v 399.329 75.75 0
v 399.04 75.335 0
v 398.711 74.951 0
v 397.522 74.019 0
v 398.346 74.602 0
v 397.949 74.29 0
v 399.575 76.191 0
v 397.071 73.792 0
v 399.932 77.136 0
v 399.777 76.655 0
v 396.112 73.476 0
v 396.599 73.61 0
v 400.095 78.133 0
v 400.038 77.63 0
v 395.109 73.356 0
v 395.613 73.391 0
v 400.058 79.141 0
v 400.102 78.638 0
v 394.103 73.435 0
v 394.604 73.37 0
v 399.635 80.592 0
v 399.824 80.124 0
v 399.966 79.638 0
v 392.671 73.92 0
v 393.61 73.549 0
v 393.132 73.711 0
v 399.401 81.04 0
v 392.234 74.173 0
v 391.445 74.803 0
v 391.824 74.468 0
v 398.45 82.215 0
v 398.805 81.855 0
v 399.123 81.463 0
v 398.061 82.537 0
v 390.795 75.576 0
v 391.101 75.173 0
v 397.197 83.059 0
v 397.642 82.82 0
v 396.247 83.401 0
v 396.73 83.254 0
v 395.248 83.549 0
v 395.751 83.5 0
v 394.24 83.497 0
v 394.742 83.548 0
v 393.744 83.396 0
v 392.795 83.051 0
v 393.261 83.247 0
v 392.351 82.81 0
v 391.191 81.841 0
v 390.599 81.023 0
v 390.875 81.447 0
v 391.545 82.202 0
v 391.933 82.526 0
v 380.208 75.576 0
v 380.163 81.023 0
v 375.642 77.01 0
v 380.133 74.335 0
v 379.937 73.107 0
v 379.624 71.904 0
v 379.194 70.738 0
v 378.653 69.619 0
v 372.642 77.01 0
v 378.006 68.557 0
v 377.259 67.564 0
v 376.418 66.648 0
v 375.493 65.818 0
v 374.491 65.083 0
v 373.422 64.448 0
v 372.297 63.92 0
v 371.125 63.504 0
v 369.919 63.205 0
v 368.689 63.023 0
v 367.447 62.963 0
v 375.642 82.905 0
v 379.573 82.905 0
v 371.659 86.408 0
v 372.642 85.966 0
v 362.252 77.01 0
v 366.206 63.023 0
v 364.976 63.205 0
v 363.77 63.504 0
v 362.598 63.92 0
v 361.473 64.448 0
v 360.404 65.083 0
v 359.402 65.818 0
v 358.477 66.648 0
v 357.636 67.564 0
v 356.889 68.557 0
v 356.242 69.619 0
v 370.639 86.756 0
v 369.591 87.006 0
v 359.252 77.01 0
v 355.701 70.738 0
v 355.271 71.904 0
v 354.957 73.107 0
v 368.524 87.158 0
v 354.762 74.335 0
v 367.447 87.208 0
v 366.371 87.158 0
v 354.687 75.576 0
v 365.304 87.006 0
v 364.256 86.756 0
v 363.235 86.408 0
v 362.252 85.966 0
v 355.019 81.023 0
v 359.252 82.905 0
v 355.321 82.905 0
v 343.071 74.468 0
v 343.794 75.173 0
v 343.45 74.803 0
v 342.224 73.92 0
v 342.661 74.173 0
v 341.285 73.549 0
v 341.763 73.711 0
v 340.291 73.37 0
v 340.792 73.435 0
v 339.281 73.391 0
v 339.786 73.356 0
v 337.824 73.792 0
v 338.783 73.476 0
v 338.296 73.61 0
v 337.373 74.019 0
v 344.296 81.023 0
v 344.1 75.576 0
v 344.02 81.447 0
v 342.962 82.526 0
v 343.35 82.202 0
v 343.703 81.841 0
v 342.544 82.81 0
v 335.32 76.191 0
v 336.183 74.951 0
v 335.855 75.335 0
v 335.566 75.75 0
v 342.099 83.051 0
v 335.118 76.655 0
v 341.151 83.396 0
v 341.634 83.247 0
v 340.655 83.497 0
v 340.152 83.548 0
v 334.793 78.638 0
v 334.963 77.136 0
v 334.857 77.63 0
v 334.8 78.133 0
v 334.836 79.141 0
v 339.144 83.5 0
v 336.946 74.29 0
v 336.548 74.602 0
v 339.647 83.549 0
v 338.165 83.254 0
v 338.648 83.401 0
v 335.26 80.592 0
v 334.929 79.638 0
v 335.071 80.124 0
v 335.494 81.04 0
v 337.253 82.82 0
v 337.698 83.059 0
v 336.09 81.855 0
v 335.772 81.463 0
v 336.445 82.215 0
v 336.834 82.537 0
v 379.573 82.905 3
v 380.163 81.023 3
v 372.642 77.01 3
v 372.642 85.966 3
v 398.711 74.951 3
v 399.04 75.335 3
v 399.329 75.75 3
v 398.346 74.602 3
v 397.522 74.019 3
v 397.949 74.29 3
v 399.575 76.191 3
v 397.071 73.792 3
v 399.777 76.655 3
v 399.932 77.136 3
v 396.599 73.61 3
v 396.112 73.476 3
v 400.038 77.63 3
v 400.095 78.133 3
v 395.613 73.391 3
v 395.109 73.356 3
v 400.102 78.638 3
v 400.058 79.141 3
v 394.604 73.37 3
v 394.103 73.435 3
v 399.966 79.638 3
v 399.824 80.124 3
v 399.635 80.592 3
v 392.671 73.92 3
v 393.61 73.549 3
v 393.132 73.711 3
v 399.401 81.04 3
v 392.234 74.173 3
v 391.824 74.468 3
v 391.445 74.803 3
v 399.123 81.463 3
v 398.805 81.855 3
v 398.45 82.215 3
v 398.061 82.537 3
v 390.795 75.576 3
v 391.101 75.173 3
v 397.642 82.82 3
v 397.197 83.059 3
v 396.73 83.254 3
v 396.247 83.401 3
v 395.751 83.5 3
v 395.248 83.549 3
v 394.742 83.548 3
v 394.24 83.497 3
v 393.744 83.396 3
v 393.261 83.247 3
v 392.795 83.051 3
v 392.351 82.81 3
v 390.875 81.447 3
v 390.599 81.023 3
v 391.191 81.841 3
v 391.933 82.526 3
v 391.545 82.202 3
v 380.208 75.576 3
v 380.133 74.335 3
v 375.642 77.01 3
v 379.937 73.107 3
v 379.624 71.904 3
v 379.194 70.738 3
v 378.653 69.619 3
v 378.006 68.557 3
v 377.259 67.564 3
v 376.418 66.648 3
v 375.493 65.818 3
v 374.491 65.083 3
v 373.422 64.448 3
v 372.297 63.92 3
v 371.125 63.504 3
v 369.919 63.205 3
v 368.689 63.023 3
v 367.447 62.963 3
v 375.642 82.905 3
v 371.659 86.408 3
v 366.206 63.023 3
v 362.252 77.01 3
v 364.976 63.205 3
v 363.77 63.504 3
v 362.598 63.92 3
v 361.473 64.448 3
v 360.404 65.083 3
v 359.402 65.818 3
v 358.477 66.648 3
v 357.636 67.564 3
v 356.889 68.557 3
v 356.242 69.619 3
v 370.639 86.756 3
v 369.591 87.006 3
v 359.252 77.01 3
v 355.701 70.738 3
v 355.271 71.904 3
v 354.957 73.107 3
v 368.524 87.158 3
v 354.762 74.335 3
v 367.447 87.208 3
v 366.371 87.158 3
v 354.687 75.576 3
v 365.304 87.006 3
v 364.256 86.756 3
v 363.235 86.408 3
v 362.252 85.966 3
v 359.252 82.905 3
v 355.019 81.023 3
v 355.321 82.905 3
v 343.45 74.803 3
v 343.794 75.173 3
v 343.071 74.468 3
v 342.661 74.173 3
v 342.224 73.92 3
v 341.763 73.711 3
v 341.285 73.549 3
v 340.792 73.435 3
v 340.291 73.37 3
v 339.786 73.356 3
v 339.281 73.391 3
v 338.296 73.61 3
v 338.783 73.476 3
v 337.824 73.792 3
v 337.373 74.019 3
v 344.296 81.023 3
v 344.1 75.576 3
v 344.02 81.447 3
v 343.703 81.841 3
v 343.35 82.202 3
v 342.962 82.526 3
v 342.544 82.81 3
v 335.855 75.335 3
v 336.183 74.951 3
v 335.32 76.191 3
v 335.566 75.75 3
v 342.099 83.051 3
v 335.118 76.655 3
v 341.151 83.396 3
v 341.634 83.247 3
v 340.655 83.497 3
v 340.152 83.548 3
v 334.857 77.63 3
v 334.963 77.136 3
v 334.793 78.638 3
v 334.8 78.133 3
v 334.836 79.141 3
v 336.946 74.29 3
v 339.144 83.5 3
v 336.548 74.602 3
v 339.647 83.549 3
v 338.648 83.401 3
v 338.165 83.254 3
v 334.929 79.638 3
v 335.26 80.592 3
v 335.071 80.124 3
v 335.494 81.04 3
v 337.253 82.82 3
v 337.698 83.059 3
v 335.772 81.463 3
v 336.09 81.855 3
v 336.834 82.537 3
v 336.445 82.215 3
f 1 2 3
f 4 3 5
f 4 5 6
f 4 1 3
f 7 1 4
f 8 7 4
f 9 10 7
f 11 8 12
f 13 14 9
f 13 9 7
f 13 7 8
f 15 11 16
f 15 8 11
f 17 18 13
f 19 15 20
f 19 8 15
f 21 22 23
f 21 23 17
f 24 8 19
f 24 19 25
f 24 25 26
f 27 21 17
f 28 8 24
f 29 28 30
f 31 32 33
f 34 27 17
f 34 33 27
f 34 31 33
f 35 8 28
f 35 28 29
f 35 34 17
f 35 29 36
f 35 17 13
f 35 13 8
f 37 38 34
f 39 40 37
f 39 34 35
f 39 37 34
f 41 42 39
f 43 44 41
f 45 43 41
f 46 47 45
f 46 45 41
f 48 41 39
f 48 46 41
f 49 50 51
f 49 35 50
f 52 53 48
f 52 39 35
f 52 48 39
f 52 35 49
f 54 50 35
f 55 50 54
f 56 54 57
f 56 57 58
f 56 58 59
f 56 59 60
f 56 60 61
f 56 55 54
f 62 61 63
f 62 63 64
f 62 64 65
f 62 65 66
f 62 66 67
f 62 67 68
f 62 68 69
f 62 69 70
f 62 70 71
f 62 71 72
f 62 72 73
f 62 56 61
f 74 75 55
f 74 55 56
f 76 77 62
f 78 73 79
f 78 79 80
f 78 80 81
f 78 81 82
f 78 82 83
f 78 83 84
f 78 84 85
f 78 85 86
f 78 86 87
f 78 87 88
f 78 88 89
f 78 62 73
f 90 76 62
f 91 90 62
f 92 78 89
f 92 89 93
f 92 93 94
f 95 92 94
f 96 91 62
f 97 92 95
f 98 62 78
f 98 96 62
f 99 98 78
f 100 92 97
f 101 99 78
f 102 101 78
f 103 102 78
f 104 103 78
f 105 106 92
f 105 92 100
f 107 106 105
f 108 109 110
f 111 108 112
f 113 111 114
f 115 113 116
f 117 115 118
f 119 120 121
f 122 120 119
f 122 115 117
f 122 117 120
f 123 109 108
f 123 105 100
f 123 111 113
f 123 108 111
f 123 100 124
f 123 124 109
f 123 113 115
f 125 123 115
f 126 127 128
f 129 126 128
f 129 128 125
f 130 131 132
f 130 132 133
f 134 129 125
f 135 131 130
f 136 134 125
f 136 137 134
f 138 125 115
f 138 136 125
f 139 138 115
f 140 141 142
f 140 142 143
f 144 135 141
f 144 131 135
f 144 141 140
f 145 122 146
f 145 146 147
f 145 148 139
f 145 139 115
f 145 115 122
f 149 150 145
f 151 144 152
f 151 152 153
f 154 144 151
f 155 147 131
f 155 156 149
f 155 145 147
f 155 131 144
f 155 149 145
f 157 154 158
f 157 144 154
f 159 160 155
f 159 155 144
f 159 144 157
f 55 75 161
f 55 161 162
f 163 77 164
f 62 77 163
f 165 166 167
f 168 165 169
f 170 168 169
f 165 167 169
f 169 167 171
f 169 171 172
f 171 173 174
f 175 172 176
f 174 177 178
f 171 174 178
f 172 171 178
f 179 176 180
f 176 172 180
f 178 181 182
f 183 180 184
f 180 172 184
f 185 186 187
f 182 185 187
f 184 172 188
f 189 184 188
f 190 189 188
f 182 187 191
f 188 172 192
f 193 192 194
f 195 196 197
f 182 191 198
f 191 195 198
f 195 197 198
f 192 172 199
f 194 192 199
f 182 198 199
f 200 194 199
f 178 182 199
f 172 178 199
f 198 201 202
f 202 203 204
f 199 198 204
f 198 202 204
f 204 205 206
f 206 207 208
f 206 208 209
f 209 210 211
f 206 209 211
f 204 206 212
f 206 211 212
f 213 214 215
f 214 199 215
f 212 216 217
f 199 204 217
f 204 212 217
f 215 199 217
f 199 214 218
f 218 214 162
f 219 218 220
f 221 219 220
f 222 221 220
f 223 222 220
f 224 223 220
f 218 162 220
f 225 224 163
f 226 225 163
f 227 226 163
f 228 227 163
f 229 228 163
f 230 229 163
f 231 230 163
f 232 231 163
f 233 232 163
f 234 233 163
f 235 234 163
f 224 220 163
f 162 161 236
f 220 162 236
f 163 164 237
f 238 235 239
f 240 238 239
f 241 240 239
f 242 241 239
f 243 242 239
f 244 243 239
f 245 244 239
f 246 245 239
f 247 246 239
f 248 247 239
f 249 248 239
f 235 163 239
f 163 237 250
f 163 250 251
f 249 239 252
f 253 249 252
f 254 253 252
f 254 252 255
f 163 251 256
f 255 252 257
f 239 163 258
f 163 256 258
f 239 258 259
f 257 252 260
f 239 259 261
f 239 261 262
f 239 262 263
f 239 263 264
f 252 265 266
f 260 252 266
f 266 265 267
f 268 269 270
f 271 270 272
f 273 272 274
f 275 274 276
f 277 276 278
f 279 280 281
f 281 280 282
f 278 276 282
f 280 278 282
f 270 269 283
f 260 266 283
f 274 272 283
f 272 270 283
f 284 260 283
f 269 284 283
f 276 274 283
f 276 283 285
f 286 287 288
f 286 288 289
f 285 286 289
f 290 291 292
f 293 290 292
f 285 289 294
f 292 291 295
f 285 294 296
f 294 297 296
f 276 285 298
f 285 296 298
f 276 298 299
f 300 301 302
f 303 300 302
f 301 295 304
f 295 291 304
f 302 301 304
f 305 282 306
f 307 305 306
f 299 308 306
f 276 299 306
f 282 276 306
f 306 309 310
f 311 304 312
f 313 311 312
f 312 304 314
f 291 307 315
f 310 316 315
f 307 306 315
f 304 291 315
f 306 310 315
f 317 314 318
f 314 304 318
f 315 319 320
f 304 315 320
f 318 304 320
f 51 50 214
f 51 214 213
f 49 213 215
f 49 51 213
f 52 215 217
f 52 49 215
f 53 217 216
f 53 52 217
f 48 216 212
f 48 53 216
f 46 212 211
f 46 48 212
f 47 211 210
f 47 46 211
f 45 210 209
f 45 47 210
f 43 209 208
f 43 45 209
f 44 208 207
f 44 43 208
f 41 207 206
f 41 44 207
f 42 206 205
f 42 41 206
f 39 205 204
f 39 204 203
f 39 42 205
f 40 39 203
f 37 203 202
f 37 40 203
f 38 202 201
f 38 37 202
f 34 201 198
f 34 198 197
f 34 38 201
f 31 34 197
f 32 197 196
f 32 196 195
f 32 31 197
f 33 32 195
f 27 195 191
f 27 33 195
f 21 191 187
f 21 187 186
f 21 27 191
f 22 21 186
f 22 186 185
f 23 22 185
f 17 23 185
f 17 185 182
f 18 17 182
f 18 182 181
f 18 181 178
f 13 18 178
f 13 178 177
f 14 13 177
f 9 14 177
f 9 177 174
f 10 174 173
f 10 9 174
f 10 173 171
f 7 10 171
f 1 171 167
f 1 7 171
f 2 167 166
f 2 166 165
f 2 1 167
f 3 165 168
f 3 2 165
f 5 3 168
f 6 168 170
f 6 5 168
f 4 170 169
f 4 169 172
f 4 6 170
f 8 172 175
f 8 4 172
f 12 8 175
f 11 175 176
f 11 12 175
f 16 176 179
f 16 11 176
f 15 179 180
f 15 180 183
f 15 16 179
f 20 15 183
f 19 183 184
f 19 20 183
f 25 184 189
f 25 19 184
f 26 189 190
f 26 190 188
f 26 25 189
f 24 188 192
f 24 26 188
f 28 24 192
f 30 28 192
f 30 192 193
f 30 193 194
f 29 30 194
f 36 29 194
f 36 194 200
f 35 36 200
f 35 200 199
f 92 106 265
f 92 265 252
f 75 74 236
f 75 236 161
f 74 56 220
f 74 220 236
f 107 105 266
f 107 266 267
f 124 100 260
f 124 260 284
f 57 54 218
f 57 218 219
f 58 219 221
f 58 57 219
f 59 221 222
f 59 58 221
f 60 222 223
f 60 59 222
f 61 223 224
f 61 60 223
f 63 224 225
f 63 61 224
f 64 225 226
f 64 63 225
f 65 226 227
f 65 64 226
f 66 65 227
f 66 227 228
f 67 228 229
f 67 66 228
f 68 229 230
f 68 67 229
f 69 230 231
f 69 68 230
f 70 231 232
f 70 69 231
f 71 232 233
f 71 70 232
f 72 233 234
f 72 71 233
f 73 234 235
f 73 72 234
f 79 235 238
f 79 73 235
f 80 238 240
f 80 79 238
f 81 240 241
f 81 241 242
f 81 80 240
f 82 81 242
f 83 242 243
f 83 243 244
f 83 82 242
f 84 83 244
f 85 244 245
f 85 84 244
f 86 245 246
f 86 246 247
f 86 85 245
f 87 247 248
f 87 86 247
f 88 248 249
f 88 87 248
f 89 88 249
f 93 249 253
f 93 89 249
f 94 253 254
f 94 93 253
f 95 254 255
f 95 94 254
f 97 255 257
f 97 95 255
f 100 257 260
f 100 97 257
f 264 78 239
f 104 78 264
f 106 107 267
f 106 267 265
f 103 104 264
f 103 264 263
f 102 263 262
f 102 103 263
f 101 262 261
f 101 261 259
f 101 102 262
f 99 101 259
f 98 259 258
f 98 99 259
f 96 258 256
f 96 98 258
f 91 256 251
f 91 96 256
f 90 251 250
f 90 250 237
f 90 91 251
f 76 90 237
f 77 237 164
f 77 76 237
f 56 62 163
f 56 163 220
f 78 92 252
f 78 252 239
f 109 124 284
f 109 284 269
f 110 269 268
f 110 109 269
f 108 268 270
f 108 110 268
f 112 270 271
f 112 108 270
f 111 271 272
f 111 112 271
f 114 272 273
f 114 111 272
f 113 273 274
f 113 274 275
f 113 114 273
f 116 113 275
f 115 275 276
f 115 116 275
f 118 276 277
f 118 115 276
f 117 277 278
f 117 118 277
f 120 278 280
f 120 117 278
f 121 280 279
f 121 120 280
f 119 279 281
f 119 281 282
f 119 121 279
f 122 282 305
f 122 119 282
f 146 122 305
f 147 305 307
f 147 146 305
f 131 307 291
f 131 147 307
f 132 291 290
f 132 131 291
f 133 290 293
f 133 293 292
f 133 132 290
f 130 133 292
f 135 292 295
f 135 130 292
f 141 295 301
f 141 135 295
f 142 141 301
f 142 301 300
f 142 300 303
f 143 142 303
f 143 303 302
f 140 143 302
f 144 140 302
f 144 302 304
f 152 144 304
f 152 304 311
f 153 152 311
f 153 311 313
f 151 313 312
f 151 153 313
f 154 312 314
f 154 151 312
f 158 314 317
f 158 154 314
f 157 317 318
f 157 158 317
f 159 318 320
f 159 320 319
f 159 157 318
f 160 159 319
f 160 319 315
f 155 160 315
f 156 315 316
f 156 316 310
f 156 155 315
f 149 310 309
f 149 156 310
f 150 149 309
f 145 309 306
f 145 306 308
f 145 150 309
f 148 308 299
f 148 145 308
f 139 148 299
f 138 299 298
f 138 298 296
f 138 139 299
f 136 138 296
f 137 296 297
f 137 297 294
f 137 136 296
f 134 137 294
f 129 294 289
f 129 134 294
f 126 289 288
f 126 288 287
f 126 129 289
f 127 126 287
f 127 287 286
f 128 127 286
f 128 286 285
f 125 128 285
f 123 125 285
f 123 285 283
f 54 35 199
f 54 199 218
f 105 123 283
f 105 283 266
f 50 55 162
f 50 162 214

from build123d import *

# Parameters (mm, degrees)
BASE_EXTRUDE_DEPTH = 3


with BuildPart() as part:
    # Sketch1 → Base-Extrude (new body)
    with BuildSketch(Plane.XY):
        with BuildLine():
            Line((380.162891568, 81.023267436), (390.599019838, 81.023267436))
            ThreePointArc((390.599019838, 81.023267436), (400.101534094, 78.637901495), (390.795096715, 75.575554167))
            Line((390.795096715, 75.575554167), (380.207812671, 75.575554167))
            ThreePointArc((380.207812671, 75.575554167), (367.447420728, 62.962928121), (354.687028785, 75.575554167))
            Line((354.687028785, 75.575554167), (344.099744741, 75.575554167))
            ThreePointArc((344.099744741, 75.575554167), (334.793307361, 78.637901495), (344.295821617, 81.023267436))
            Line((344.295821617, 81.023267436), (355.018550657, 81.023267436))
            Line((355.018550657, 81.023267436), (355.321416521, 82.905419895))
            Line((355.321416521, 82.905419895), (359.252420728, 82.905419895))
            Line((359.252420728, 82.905419895), (359.252420728, 77.010044337))
            Line((359.252420728, 77.010044337), (362.252420728, 77.010044337))
            Line((362.252420728, 77.010044337), (362.252420728, 85.966138483))
            ThreePointArc((362.252420728, 85.966138483), (367.447420728, 87.208332237), (372.642420728, 85.966138483))
            Line((372.642420728, 85.966138483), (372.642420728, 77.010044337))
            Line((372.642420728, 77.010044337), (375.642420728, 77.010044337))
            Line((375.642420728, 77.010044337), (375.642420728, 82.905419895))
            Line((375.642420728, 82.905419895), (379.573424935, 82.905419895))
            Line((379.573424935, 82.905419895), (380.162891568, 81.023267436))
        make_face()
    extrude(amount=BASE_EXTRUDE_DEPTH)


solid = part.part
